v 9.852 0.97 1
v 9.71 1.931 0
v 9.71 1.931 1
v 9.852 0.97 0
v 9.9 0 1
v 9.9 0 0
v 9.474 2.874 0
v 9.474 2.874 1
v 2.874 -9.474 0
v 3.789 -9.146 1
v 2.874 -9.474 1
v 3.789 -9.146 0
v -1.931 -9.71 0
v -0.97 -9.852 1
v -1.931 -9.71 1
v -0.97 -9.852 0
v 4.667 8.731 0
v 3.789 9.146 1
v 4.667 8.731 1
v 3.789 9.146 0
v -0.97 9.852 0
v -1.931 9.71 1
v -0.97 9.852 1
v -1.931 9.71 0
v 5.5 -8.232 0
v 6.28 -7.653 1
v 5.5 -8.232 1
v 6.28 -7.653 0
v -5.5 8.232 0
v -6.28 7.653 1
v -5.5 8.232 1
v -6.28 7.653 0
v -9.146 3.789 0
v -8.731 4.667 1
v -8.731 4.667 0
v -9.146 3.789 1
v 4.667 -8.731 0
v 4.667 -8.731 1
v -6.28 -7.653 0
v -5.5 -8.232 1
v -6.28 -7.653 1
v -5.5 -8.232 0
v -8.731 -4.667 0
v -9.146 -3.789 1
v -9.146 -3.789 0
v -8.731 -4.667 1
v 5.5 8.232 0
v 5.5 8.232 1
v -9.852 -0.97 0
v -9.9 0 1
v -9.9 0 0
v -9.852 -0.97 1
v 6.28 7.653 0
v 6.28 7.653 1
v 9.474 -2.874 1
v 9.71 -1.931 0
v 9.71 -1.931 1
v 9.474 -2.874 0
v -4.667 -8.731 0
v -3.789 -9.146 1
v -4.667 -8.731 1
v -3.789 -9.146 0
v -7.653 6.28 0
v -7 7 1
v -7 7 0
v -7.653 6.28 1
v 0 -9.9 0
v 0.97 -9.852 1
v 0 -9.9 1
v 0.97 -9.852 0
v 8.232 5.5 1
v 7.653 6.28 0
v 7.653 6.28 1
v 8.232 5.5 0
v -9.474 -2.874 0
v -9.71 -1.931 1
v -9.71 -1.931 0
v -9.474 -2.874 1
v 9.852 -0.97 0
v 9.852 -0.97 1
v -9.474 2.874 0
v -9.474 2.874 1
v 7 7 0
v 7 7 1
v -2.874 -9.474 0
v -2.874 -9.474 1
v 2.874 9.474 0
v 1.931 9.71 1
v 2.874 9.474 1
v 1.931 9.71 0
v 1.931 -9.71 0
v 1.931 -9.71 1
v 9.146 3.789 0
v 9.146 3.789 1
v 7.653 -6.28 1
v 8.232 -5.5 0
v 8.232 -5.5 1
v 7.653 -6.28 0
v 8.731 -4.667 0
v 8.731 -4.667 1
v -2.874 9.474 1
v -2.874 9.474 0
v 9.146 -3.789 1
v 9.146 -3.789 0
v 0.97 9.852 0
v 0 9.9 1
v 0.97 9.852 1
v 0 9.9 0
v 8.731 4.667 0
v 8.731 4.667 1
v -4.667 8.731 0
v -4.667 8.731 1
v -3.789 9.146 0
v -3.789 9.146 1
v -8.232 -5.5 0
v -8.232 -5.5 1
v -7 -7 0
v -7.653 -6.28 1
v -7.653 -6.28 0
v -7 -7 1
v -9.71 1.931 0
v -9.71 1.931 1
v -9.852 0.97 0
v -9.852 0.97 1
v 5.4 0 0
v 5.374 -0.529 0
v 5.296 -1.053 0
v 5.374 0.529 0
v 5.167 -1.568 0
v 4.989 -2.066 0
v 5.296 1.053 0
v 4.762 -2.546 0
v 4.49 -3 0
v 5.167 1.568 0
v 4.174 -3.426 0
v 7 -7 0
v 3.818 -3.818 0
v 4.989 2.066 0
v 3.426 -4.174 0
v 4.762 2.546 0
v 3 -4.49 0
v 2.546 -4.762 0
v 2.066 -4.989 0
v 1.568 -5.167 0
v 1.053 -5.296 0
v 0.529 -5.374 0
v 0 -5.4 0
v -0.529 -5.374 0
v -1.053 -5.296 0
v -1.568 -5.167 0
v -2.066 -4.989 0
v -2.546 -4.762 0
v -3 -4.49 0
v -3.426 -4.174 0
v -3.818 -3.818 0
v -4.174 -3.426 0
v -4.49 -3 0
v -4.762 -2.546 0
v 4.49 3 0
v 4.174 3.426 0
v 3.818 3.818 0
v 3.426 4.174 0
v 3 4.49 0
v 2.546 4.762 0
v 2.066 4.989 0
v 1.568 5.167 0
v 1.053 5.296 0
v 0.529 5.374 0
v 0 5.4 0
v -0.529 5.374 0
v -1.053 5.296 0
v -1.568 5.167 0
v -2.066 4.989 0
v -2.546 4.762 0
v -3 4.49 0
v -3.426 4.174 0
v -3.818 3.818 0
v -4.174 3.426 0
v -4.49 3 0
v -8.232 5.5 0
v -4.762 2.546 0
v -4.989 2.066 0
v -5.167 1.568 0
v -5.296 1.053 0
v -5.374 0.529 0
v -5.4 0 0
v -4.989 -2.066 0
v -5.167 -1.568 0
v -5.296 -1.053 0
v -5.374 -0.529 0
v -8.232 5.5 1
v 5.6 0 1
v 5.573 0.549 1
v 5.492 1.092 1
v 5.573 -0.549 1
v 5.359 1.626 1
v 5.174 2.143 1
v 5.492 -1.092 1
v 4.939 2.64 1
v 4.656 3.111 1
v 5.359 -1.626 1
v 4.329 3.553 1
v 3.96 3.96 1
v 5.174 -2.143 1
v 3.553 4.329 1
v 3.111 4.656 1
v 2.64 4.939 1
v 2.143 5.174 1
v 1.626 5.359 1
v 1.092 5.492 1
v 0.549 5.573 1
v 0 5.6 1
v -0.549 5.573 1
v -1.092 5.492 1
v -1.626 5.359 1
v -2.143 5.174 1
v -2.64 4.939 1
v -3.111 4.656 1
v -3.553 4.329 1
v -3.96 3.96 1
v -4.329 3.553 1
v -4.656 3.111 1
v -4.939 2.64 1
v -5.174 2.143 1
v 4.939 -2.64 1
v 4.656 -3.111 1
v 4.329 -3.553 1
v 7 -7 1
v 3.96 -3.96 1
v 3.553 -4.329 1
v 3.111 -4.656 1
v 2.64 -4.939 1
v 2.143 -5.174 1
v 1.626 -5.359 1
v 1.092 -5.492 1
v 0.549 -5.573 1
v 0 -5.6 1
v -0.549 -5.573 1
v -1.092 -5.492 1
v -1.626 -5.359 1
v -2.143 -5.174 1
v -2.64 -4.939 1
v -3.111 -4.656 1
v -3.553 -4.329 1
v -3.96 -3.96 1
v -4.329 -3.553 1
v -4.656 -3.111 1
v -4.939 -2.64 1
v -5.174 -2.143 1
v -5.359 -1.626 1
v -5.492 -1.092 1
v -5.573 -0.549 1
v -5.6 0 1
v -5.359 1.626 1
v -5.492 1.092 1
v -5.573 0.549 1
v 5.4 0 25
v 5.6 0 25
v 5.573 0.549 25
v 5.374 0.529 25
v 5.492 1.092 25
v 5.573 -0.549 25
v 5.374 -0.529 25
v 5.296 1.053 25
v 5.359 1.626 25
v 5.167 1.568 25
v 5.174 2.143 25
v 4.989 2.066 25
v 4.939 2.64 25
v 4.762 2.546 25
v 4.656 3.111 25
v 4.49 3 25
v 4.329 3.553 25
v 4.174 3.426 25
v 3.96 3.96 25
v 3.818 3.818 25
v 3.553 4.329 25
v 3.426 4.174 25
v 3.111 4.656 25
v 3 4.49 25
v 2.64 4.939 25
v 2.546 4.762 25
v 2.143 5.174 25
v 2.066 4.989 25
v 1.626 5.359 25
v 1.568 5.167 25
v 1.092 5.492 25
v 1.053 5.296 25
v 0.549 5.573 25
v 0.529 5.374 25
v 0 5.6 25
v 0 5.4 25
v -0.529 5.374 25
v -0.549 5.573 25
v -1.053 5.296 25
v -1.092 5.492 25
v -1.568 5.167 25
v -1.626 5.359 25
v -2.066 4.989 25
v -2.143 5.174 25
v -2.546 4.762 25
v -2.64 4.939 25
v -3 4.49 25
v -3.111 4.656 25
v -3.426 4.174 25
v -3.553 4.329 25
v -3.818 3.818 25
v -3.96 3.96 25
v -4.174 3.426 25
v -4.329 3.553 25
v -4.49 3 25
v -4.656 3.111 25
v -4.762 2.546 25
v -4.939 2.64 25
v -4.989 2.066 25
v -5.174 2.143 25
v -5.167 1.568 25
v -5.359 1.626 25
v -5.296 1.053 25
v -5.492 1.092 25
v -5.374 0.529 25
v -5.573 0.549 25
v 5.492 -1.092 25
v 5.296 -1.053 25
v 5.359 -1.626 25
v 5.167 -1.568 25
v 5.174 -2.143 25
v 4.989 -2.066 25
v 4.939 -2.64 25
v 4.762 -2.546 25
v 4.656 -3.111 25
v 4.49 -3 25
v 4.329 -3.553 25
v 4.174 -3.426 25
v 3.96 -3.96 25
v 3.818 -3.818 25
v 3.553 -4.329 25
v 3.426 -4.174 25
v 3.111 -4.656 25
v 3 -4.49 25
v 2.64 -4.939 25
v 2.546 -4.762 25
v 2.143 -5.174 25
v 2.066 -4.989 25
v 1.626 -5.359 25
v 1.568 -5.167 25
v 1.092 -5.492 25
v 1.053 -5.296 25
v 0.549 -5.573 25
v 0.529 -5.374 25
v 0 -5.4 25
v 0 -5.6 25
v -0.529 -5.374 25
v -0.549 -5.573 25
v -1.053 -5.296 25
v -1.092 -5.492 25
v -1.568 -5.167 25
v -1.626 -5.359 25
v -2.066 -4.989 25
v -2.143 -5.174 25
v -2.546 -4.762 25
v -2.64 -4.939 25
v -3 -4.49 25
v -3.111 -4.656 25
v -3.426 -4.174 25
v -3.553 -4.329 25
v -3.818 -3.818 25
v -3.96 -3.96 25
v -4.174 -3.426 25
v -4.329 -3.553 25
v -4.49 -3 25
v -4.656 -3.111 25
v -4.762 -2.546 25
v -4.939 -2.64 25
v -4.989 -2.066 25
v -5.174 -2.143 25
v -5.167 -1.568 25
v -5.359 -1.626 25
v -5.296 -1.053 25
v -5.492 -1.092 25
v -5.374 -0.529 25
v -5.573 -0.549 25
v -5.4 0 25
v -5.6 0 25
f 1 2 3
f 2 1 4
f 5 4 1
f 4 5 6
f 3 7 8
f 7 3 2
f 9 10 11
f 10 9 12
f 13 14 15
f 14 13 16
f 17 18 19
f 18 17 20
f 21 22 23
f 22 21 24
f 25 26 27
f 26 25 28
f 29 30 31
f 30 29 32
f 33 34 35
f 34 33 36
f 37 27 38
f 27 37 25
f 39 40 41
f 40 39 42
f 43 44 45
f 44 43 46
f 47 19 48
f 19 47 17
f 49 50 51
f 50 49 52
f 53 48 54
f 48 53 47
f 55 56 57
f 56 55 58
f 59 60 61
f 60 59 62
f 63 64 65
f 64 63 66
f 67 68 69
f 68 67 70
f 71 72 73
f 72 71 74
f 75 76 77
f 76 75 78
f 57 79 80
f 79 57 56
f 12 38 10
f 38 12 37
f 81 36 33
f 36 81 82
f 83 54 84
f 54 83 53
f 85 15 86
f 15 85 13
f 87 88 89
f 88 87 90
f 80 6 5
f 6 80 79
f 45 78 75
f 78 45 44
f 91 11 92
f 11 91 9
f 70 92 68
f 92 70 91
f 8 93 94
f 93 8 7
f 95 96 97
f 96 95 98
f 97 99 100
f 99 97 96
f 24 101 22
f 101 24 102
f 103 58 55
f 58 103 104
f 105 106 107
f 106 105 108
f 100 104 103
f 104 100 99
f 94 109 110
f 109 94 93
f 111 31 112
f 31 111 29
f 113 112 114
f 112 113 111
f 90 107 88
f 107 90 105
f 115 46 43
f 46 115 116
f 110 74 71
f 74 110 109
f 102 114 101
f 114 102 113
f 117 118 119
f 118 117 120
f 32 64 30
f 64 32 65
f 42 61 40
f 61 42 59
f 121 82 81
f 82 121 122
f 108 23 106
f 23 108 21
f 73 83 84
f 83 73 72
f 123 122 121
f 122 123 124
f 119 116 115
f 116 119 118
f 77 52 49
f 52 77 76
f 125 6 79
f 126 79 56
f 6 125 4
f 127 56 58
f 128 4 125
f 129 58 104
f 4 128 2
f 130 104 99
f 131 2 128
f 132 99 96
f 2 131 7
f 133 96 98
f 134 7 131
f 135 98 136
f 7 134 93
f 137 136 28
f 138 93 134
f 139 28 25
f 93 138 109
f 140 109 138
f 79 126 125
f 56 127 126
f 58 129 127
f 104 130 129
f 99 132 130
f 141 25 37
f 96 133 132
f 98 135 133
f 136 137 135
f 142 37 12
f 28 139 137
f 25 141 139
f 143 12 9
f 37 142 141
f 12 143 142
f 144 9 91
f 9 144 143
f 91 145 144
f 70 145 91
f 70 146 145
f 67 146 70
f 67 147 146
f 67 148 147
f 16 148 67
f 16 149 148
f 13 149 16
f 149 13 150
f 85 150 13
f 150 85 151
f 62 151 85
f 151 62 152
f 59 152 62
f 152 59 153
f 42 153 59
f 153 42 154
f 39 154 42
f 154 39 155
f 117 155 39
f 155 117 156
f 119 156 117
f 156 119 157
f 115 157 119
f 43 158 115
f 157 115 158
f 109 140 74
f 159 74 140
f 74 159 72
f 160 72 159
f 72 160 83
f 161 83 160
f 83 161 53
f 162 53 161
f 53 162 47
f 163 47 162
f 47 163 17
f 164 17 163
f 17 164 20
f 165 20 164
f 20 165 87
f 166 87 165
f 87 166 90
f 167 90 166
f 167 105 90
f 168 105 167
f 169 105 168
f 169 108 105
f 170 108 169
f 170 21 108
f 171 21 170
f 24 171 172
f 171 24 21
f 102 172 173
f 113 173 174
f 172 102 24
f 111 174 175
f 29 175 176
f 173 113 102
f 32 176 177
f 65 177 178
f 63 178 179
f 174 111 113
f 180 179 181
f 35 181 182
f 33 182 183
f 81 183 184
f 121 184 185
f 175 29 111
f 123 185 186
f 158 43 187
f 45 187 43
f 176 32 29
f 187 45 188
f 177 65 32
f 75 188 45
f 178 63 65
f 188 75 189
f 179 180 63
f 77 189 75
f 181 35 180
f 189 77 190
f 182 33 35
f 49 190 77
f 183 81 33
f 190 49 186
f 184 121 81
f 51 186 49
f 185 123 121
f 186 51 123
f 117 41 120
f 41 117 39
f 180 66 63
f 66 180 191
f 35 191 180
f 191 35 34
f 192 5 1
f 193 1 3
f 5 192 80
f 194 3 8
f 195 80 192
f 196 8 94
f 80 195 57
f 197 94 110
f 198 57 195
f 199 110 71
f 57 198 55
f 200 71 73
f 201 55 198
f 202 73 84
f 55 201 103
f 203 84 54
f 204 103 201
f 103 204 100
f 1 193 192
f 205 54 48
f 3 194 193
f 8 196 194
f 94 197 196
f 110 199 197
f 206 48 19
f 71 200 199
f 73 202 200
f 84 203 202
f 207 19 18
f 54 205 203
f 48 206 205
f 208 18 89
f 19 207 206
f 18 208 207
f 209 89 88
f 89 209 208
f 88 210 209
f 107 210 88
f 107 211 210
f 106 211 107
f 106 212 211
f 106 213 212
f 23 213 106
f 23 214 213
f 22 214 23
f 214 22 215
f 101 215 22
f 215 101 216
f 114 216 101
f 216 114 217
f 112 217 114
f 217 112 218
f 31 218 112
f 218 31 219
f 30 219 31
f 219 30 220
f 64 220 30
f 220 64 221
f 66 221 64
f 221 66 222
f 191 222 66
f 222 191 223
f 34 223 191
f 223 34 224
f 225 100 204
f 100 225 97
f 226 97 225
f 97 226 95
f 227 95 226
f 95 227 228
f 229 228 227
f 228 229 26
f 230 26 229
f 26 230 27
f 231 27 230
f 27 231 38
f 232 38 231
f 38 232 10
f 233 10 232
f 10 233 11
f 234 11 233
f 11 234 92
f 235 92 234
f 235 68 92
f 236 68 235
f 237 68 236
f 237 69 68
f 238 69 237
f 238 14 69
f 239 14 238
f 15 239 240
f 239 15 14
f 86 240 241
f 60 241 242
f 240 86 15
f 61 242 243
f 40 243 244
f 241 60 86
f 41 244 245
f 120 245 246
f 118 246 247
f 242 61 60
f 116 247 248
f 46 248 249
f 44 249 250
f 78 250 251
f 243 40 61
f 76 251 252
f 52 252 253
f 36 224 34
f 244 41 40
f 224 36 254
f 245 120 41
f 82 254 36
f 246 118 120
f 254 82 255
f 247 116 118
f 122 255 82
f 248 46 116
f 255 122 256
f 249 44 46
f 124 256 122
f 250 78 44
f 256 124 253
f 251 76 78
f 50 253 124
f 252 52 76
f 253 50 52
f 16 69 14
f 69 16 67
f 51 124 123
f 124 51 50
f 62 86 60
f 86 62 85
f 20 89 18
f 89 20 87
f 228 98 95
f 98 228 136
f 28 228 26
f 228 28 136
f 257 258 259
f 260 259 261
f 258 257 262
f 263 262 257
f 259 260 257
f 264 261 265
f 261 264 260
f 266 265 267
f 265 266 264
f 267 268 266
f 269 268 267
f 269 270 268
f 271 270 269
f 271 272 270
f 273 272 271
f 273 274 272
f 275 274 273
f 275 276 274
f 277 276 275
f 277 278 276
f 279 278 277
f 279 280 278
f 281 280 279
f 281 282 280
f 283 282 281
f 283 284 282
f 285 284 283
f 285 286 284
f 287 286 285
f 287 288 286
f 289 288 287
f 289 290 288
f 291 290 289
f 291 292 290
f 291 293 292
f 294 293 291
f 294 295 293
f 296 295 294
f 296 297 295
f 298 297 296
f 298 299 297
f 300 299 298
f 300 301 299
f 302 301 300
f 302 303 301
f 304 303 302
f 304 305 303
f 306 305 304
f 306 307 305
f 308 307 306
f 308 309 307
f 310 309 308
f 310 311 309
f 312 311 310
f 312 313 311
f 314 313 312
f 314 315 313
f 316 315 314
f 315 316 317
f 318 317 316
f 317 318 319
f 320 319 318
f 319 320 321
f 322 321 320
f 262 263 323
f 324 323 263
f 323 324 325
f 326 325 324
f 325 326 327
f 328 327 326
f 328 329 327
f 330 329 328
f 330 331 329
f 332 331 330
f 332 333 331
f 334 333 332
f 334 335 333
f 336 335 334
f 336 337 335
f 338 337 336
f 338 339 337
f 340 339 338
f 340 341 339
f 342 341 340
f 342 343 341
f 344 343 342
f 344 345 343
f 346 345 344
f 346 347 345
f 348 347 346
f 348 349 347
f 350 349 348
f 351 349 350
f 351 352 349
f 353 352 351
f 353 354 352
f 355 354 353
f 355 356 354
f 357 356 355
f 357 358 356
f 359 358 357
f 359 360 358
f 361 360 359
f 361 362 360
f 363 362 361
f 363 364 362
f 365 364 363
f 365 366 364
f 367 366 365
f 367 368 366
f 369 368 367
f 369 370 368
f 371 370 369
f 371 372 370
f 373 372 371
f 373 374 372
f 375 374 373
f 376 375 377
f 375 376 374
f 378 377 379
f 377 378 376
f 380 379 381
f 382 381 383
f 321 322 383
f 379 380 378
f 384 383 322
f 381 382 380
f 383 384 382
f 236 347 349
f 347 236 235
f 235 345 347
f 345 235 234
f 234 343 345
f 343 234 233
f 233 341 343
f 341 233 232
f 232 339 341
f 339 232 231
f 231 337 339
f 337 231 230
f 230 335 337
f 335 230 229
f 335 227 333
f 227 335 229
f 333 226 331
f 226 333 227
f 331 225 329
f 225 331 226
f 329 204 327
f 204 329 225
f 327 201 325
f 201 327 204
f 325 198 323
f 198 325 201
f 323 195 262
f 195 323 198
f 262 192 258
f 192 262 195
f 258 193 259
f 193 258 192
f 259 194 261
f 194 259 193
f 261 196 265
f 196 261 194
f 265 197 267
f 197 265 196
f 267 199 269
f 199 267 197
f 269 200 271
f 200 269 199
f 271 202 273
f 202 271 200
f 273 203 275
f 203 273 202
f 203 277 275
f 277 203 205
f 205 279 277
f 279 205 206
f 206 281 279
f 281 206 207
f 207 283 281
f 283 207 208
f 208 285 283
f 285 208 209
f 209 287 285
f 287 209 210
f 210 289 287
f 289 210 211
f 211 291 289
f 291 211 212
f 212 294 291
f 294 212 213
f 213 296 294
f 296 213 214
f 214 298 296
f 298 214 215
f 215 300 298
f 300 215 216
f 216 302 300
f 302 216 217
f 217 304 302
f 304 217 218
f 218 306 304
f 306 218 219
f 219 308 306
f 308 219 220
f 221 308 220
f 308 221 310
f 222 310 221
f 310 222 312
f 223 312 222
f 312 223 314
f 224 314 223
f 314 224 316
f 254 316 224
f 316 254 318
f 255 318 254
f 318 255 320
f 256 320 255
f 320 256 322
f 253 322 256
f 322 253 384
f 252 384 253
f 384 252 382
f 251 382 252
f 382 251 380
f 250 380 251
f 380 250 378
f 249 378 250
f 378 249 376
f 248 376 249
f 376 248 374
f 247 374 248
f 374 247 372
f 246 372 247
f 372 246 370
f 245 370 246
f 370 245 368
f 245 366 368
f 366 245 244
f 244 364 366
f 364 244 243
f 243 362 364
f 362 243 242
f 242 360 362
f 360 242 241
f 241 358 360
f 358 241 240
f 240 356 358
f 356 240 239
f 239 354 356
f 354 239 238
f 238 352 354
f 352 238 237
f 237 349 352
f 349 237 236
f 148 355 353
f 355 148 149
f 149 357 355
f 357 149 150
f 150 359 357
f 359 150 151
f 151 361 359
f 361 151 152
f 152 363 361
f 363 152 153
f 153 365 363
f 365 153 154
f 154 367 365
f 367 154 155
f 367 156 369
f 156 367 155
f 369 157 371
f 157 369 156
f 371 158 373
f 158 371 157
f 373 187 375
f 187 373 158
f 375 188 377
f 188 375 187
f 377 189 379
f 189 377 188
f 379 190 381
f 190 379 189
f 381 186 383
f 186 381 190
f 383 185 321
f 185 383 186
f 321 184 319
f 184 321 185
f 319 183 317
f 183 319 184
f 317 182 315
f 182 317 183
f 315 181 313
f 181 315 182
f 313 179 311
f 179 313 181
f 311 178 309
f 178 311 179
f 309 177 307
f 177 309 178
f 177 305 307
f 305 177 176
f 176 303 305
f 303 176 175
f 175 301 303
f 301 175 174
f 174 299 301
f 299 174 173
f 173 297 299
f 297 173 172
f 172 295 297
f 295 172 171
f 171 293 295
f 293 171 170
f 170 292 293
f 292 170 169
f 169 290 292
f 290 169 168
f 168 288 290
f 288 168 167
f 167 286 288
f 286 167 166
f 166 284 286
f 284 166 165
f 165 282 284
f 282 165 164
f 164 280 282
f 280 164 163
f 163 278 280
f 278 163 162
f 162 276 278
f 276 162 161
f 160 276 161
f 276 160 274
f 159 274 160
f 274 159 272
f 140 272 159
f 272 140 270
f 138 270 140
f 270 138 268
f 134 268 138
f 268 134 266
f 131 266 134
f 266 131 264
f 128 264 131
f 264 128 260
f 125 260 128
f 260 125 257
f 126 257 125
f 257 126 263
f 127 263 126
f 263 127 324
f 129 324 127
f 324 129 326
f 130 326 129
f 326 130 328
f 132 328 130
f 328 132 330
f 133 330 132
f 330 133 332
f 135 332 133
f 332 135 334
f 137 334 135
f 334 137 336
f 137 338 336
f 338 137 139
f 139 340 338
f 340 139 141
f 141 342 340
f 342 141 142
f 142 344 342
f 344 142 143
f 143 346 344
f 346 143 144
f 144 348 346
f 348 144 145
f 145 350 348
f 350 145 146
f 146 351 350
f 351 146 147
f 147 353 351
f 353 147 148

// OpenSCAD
$fn = 64;

nozzle_diameter = 0.4;

// outer diameter of the tube we're using.
tube_diameter = 10.0;

// Tolerances to add to an inner diameter so it fits over
tight_fit = 0.2;
loose_fit = 0.4;

epsilon = 0.01;

module tube(inner_diameter, outer_diameter, length){
    linear_extrude(length){
        difference(){
            circle(d = outer_diameter);
            circle(d = inner_diameter);
        }
    }
}



module base(inner_diameter, outer_diameter, thickness) {
    difference() {
        cylinder(d = outer_diameter, h = thickness);
        translate([0, 0, -epsilon])
        cylinder(d = inner_diameter, h = thickness + epsilon * 2);
    }
}


// Makes one half of a magnet coil winder.
// Print 2 for a full winder
// Use a calculator to find the length and height to use:
// https://www.accelinstruments.com/Magnetic/Magnetic-field-calculator.html
module half_coil(coil_length, coil_height) {
    coil_diameter = tube_diameter + nozzle_diameter + loose_fit;
    base_diameter = coil_diameter + coil_height;
    length = coil_length / 2;
    
    base_thickness = 2;
    base(coil_diameter, base_diameter, 1);
    tube(coil_diameter, coil_diameter + nozzle_diameter, length);
}

half_coil(50, 9);
//half_coil(30, 5.513);
//half_coil(15, 8.820);
